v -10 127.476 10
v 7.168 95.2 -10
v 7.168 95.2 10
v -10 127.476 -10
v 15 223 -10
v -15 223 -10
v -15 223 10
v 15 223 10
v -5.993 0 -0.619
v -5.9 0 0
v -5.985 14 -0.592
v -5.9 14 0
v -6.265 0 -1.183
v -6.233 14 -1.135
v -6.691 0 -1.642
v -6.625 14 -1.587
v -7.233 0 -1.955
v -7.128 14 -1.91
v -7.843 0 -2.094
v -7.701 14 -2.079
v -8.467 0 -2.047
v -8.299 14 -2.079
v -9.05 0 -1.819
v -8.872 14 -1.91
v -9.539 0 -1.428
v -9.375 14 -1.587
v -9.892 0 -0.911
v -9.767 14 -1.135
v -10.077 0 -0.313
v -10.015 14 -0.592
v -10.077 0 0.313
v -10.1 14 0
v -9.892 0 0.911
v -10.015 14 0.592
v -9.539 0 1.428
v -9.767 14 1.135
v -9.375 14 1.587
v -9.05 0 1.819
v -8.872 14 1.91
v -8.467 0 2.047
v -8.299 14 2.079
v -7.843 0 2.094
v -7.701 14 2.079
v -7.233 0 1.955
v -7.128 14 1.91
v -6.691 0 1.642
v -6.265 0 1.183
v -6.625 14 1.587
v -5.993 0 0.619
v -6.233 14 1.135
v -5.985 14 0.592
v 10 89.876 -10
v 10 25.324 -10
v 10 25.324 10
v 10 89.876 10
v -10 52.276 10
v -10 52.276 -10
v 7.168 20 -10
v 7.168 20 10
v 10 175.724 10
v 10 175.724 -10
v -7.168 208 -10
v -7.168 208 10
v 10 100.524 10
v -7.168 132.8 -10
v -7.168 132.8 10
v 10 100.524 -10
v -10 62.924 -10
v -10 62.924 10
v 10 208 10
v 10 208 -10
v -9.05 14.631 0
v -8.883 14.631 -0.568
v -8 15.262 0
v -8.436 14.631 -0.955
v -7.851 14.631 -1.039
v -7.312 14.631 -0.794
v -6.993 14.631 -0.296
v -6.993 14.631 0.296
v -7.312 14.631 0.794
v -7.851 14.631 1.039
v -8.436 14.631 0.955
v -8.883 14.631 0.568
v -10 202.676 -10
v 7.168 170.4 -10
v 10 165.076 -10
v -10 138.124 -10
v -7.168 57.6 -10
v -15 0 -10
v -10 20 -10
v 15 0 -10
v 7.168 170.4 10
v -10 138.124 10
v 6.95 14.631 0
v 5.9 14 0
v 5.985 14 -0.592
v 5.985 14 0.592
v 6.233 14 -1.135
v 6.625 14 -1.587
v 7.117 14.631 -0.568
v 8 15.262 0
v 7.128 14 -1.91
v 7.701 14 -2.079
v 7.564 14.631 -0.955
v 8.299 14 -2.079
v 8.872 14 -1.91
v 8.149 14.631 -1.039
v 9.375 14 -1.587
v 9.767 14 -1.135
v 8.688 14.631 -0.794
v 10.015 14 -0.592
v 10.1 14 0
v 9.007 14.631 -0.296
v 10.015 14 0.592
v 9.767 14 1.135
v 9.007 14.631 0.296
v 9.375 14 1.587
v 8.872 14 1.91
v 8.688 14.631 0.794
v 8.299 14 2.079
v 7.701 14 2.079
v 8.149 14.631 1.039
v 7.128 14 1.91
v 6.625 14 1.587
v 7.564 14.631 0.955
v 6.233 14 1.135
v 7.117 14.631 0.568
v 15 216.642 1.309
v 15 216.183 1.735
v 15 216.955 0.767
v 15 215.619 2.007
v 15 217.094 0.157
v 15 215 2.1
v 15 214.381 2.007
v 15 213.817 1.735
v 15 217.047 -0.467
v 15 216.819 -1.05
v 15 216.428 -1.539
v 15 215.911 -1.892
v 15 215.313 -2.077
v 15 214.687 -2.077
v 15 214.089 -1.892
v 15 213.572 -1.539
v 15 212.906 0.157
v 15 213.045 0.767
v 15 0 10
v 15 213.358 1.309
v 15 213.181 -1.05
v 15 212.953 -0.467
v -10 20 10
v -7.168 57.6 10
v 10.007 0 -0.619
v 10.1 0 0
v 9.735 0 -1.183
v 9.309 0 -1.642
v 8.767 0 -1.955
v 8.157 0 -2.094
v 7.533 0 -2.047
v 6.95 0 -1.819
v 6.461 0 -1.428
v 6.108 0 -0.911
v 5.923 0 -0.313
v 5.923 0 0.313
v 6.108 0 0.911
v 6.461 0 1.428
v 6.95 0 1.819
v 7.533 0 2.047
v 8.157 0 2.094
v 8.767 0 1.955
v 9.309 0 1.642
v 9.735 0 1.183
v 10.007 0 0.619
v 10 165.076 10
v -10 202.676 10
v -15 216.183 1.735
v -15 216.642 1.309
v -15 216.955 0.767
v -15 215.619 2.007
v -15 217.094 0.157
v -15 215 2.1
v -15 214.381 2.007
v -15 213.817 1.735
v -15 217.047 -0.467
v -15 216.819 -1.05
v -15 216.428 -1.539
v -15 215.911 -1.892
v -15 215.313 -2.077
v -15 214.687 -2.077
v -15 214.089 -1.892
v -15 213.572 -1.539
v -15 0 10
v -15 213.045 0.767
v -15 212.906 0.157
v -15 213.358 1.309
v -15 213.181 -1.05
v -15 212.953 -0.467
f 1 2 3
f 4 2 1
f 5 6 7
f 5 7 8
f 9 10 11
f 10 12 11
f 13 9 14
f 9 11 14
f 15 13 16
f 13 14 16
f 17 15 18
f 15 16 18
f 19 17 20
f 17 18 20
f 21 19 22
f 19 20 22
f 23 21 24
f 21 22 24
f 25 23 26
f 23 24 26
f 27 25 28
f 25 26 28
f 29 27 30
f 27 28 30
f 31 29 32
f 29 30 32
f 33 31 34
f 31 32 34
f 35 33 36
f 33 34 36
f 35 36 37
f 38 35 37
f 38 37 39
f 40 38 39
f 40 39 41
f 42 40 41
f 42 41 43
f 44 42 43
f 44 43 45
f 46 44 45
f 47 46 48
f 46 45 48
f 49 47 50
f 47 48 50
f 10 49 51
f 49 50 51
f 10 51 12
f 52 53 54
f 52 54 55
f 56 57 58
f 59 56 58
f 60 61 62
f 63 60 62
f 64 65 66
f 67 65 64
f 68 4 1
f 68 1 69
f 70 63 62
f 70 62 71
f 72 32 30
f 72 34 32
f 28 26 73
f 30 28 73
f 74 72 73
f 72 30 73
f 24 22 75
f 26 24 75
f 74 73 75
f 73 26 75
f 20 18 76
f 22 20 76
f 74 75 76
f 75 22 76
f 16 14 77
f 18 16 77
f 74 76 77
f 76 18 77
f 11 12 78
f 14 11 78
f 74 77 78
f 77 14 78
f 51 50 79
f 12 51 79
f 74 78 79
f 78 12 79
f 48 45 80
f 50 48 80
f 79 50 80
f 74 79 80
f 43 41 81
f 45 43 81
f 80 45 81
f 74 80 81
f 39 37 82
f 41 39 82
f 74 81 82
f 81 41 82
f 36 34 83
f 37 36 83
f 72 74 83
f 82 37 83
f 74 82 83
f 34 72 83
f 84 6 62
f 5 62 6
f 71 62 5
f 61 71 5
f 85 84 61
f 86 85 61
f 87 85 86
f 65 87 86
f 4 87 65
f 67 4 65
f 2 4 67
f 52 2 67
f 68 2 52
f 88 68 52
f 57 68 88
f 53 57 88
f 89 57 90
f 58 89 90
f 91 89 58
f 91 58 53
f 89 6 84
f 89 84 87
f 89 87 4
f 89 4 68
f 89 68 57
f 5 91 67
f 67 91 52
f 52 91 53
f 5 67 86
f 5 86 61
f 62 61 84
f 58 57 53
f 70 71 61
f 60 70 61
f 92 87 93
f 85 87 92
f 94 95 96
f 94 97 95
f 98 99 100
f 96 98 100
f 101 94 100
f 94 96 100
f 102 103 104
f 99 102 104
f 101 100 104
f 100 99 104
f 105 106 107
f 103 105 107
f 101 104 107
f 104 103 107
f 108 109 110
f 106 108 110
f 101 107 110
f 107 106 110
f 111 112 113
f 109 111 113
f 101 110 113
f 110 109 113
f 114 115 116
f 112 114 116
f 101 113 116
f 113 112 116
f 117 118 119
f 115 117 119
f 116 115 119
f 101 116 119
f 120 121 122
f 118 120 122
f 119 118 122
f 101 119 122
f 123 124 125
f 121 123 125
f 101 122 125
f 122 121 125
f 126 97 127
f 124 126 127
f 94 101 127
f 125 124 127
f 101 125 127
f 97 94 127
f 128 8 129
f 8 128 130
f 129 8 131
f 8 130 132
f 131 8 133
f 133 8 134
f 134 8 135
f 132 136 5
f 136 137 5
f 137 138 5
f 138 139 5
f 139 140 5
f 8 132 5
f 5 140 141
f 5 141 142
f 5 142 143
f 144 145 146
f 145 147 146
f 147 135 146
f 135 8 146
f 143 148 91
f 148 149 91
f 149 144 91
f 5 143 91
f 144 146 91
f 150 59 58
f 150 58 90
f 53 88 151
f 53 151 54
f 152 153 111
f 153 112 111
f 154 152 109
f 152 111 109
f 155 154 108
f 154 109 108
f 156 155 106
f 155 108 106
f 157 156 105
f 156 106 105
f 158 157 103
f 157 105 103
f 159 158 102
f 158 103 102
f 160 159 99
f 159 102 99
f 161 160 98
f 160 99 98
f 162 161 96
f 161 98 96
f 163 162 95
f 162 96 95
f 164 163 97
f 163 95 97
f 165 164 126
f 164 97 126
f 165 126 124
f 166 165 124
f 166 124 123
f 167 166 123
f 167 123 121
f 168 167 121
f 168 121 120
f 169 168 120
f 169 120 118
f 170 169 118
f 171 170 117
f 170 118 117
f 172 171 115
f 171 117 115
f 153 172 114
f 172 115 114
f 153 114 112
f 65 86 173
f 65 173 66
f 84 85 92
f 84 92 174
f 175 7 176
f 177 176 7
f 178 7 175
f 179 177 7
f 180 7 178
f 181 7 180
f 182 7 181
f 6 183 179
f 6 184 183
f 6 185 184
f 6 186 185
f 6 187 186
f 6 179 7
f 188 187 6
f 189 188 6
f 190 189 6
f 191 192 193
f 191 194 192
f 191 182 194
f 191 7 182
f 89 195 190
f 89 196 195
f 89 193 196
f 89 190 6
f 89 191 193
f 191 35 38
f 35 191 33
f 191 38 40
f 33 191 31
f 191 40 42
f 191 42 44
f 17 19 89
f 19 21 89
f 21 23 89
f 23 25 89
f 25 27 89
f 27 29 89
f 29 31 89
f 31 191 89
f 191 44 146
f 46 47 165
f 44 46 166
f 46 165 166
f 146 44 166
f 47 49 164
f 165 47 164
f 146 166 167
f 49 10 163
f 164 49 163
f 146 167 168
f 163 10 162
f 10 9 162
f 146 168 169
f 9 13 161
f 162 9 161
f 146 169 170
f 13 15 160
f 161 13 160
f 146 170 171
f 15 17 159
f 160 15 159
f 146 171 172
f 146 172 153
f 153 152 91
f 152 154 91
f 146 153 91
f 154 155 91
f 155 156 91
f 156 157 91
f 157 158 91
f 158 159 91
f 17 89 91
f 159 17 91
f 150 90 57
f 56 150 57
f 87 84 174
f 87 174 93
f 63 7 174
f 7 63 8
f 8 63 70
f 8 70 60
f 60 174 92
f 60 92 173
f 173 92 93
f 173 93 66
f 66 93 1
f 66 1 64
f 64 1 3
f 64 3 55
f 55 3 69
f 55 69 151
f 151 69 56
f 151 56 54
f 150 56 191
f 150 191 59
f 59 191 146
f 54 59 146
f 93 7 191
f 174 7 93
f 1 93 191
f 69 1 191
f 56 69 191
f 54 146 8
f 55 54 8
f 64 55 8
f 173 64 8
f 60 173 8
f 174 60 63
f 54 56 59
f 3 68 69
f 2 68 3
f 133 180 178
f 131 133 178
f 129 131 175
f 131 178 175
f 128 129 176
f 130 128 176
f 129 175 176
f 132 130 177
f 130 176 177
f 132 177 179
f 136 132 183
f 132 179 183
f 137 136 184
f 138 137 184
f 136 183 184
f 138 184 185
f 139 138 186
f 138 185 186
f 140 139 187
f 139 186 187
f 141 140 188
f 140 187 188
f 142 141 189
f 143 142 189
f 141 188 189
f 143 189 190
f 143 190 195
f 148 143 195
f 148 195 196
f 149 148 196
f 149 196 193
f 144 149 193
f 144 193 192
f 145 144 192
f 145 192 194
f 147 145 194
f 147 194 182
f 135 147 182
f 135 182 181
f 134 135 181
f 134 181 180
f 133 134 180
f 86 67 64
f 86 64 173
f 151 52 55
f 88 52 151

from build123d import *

# Parameters (mm, degrees)
SKETCH_1_W             = 30
SKETCH_1_H             = 20
EXTRUDE_1_DEPTH        = 223
CUT_EXTRUDE_1_DEPTH    = 225.396969677
HOLE_WIZARD_M5_1_D     = 4.2
HOLE_WIZARD_M5_1_DEPTH = 14
HOLE_WIZARD_M5_1_TIP   = 1.2618073
HOLE_WIZARD_M5_2_D     = 4.2


with BuildPart() as part:
    # 草图1 → 凸台-拉伸1 (new body)
    with BuildSketch(Plane(origin=(0, 0, 0), x_dir=(1, 0, 0), z_dir=(0, 1, 0))):
        Rectangle(SKETCH_1_W, SKETCH_1_H)
    extrude(amount=EXTRUDE_1_DEPTH)

    # 草图2 → 切除-拉伸1 (cut, through all)
    with BuildSketch(Plane.XY.offset(-10)):
        Polygon((7.168333691, 20), (-10, 20), (-10, 52.276467338), align=None)
        Polygon((10, 89.876467338), (-7.168333691, 57.6), (10, 25.323532662), align=None)
        Polygon((-10, 127.476467338), (-10, 62.923532662), (7.168333691, 95.2), align=None)
        Polygon((10, 165.076467338), (-7.168333691, 132.8), (10, 100.523532662), align=None)
        Polygon((-10, 202.676467338), (-10, 138.123532662), (7.168333691, 170.4), align=None)
        Polygon((-7.168333691, 208), (10, 208), (10, 175.723532662), align=None)
    extrude(amount=CUT_EXTRUDE_1_DEPTH, mode=Mode.SUBTRACT)

    # M5 螺纹孔1
    with Locations(Plane(origin=(0, 0, 0), x_dir=(-1, 0, 0), z_dir=(0, -1, 0))):
        with Locations((8, 0), (-8, 0)):
            Hole(HOLE_WIZARD_M5_1_D / 2, depth=HOLE_WIZARD_M5_1_DEPTH)
            with Locations((0, 0, -(HOLE_WIZARD_M5_1_DEPTH + HOLE_WIZARD_M5_1_TIP / 2))):  # 118° drill point
                Cone(0, HOLE_WIZARD_M5_1_D / 2, HOLE_WIZARD_M5_1_TIP, mode=Mode.SUBTRACT)

    # M5 螺纹孔2 (through all)
    with Locations(Plane(origin=(15, 0, 0), x_dir=(0, 0, -1), z_dir=(1, 0, 0))):
        with Locations((0, 215)):
            Hole(HOLE_WIZARD_M5_2_D / 2)


solid = part.part
